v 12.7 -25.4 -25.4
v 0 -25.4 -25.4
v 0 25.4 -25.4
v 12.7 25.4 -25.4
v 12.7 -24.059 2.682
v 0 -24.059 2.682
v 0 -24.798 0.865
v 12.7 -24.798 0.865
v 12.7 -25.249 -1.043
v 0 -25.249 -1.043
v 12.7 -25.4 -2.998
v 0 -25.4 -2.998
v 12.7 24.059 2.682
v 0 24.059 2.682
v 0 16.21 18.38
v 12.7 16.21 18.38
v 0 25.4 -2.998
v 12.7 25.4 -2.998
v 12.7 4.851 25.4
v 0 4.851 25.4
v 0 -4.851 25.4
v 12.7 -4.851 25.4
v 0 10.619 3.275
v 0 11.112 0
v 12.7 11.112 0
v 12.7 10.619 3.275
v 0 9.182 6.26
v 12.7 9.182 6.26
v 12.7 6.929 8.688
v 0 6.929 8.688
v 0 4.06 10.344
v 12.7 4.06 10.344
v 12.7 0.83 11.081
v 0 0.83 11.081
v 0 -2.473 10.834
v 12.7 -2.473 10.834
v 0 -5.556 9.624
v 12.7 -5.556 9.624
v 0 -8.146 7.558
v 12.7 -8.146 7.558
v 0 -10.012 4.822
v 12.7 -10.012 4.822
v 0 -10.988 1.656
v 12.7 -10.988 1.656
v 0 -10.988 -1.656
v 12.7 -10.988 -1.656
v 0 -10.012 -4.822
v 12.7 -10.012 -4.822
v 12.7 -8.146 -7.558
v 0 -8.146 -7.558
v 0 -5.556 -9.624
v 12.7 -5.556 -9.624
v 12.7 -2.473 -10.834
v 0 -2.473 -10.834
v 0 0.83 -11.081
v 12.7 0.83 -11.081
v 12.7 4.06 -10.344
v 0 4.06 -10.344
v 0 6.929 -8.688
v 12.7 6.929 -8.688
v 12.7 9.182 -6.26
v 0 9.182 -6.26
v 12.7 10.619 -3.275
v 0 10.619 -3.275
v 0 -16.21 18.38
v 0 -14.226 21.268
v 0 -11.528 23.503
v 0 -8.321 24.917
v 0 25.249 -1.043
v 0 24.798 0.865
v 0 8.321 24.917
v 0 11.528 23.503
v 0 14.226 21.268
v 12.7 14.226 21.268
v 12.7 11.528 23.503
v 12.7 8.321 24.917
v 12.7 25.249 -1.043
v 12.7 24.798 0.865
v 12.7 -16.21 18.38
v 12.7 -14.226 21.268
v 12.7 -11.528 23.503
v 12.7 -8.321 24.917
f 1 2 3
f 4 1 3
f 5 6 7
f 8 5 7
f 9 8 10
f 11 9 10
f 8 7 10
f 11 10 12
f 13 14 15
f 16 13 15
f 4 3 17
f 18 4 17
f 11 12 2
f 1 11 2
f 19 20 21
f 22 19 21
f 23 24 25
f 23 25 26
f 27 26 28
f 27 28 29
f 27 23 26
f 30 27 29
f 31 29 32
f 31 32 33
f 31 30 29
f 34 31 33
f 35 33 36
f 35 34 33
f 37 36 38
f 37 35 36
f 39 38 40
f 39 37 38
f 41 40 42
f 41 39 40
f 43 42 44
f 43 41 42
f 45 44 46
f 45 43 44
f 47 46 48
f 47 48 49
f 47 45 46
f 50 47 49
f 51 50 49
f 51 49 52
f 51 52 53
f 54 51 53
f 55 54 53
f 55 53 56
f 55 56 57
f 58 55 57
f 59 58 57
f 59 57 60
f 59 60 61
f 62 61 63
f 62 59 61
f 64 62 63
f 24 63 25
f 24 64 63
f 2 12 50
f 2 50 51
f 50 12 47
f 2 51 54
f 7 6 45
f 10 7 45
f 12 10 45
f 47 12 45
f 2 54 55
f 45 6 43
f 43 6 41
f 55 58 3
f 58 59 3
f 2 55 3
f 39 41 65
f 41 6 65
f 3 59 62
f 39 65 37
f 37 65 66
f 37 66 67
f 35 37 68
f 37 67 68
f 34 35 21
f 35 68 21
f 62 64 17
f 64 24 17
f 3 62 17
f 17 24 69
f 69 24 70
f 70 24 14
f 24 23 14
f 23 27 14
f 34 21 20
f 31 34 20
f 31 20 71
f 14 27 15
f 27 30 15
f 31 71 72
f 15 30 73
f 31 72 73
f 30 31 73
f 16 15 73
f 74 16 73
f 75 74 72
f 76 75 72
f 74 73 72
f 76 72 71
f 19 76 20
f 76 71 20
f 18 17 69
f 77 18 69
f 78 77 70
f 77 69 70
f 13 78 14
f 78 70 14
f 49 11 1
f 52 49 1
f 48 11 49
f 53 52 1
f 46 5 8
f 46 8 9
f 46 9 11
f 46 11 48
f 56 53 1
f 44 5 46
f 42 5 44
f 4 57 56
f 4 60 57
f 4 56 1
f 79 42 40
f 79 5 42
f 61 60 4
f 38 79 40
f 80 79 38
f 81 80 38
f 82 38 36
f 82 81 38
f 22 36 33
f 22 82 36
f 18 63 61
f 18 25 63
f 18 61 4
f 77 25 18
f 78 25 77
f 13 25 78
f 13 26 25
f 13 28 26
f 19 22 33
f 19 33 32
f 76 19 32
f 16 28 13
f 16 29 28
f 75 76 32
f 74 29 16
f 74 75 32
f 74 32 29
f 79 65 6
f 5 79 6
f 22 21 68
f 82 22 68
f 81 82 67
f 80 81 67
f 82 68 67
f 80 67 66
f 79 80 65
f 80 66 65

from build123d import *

# Parameters (mm, degrees)
F0_R     = 11.1125
F1_DEPTH = 12.7


with BuildPart() as f1:
    # F0 (on Right) → F1 (new body)
    with BuildSketch(Plane.YZ):
        with BuildLine():
            Line((4.850968, 25.4), (0, 25.4))
            Line((0, 25.4), (-4.850968, 25.4))
            ThreePointArc((-4.850968, 25.4), (-11.527753, 23.503265), (-16.210194, 18.379613))
            Line((-16.210194, 18.379613), (-24.059225, 2.681549))
            ThreePointArc((-24.059225, 2.681549), (-25.060262, -0.080201), (-25.4, -2.998063))
            Line((-25.4, -2.998063), (-25.4, -25.4))
            Line((-25.4, -25.4), (0, -25.4))
            Line((0, -25.4), (25.4, -25.4))
            Line((25.4, -25.4), (25.4, -2.998063))
            ThreePointArc((25.4, -2.998063), (25.060262, -0.080201), (24.059225, 2.681549))
            Line((24.059225, 2.681549), (16.210194, 18.379613))
            ThreePointArc((16.210194, 18.379613), (11.527753, 23.503265), (4.850968, 25.4))
        make_face()
        Circle(F0_R, mode=Mode.SUBTRACT)
    extrude(amount=F1_DEPTH)


solid = f1.part
